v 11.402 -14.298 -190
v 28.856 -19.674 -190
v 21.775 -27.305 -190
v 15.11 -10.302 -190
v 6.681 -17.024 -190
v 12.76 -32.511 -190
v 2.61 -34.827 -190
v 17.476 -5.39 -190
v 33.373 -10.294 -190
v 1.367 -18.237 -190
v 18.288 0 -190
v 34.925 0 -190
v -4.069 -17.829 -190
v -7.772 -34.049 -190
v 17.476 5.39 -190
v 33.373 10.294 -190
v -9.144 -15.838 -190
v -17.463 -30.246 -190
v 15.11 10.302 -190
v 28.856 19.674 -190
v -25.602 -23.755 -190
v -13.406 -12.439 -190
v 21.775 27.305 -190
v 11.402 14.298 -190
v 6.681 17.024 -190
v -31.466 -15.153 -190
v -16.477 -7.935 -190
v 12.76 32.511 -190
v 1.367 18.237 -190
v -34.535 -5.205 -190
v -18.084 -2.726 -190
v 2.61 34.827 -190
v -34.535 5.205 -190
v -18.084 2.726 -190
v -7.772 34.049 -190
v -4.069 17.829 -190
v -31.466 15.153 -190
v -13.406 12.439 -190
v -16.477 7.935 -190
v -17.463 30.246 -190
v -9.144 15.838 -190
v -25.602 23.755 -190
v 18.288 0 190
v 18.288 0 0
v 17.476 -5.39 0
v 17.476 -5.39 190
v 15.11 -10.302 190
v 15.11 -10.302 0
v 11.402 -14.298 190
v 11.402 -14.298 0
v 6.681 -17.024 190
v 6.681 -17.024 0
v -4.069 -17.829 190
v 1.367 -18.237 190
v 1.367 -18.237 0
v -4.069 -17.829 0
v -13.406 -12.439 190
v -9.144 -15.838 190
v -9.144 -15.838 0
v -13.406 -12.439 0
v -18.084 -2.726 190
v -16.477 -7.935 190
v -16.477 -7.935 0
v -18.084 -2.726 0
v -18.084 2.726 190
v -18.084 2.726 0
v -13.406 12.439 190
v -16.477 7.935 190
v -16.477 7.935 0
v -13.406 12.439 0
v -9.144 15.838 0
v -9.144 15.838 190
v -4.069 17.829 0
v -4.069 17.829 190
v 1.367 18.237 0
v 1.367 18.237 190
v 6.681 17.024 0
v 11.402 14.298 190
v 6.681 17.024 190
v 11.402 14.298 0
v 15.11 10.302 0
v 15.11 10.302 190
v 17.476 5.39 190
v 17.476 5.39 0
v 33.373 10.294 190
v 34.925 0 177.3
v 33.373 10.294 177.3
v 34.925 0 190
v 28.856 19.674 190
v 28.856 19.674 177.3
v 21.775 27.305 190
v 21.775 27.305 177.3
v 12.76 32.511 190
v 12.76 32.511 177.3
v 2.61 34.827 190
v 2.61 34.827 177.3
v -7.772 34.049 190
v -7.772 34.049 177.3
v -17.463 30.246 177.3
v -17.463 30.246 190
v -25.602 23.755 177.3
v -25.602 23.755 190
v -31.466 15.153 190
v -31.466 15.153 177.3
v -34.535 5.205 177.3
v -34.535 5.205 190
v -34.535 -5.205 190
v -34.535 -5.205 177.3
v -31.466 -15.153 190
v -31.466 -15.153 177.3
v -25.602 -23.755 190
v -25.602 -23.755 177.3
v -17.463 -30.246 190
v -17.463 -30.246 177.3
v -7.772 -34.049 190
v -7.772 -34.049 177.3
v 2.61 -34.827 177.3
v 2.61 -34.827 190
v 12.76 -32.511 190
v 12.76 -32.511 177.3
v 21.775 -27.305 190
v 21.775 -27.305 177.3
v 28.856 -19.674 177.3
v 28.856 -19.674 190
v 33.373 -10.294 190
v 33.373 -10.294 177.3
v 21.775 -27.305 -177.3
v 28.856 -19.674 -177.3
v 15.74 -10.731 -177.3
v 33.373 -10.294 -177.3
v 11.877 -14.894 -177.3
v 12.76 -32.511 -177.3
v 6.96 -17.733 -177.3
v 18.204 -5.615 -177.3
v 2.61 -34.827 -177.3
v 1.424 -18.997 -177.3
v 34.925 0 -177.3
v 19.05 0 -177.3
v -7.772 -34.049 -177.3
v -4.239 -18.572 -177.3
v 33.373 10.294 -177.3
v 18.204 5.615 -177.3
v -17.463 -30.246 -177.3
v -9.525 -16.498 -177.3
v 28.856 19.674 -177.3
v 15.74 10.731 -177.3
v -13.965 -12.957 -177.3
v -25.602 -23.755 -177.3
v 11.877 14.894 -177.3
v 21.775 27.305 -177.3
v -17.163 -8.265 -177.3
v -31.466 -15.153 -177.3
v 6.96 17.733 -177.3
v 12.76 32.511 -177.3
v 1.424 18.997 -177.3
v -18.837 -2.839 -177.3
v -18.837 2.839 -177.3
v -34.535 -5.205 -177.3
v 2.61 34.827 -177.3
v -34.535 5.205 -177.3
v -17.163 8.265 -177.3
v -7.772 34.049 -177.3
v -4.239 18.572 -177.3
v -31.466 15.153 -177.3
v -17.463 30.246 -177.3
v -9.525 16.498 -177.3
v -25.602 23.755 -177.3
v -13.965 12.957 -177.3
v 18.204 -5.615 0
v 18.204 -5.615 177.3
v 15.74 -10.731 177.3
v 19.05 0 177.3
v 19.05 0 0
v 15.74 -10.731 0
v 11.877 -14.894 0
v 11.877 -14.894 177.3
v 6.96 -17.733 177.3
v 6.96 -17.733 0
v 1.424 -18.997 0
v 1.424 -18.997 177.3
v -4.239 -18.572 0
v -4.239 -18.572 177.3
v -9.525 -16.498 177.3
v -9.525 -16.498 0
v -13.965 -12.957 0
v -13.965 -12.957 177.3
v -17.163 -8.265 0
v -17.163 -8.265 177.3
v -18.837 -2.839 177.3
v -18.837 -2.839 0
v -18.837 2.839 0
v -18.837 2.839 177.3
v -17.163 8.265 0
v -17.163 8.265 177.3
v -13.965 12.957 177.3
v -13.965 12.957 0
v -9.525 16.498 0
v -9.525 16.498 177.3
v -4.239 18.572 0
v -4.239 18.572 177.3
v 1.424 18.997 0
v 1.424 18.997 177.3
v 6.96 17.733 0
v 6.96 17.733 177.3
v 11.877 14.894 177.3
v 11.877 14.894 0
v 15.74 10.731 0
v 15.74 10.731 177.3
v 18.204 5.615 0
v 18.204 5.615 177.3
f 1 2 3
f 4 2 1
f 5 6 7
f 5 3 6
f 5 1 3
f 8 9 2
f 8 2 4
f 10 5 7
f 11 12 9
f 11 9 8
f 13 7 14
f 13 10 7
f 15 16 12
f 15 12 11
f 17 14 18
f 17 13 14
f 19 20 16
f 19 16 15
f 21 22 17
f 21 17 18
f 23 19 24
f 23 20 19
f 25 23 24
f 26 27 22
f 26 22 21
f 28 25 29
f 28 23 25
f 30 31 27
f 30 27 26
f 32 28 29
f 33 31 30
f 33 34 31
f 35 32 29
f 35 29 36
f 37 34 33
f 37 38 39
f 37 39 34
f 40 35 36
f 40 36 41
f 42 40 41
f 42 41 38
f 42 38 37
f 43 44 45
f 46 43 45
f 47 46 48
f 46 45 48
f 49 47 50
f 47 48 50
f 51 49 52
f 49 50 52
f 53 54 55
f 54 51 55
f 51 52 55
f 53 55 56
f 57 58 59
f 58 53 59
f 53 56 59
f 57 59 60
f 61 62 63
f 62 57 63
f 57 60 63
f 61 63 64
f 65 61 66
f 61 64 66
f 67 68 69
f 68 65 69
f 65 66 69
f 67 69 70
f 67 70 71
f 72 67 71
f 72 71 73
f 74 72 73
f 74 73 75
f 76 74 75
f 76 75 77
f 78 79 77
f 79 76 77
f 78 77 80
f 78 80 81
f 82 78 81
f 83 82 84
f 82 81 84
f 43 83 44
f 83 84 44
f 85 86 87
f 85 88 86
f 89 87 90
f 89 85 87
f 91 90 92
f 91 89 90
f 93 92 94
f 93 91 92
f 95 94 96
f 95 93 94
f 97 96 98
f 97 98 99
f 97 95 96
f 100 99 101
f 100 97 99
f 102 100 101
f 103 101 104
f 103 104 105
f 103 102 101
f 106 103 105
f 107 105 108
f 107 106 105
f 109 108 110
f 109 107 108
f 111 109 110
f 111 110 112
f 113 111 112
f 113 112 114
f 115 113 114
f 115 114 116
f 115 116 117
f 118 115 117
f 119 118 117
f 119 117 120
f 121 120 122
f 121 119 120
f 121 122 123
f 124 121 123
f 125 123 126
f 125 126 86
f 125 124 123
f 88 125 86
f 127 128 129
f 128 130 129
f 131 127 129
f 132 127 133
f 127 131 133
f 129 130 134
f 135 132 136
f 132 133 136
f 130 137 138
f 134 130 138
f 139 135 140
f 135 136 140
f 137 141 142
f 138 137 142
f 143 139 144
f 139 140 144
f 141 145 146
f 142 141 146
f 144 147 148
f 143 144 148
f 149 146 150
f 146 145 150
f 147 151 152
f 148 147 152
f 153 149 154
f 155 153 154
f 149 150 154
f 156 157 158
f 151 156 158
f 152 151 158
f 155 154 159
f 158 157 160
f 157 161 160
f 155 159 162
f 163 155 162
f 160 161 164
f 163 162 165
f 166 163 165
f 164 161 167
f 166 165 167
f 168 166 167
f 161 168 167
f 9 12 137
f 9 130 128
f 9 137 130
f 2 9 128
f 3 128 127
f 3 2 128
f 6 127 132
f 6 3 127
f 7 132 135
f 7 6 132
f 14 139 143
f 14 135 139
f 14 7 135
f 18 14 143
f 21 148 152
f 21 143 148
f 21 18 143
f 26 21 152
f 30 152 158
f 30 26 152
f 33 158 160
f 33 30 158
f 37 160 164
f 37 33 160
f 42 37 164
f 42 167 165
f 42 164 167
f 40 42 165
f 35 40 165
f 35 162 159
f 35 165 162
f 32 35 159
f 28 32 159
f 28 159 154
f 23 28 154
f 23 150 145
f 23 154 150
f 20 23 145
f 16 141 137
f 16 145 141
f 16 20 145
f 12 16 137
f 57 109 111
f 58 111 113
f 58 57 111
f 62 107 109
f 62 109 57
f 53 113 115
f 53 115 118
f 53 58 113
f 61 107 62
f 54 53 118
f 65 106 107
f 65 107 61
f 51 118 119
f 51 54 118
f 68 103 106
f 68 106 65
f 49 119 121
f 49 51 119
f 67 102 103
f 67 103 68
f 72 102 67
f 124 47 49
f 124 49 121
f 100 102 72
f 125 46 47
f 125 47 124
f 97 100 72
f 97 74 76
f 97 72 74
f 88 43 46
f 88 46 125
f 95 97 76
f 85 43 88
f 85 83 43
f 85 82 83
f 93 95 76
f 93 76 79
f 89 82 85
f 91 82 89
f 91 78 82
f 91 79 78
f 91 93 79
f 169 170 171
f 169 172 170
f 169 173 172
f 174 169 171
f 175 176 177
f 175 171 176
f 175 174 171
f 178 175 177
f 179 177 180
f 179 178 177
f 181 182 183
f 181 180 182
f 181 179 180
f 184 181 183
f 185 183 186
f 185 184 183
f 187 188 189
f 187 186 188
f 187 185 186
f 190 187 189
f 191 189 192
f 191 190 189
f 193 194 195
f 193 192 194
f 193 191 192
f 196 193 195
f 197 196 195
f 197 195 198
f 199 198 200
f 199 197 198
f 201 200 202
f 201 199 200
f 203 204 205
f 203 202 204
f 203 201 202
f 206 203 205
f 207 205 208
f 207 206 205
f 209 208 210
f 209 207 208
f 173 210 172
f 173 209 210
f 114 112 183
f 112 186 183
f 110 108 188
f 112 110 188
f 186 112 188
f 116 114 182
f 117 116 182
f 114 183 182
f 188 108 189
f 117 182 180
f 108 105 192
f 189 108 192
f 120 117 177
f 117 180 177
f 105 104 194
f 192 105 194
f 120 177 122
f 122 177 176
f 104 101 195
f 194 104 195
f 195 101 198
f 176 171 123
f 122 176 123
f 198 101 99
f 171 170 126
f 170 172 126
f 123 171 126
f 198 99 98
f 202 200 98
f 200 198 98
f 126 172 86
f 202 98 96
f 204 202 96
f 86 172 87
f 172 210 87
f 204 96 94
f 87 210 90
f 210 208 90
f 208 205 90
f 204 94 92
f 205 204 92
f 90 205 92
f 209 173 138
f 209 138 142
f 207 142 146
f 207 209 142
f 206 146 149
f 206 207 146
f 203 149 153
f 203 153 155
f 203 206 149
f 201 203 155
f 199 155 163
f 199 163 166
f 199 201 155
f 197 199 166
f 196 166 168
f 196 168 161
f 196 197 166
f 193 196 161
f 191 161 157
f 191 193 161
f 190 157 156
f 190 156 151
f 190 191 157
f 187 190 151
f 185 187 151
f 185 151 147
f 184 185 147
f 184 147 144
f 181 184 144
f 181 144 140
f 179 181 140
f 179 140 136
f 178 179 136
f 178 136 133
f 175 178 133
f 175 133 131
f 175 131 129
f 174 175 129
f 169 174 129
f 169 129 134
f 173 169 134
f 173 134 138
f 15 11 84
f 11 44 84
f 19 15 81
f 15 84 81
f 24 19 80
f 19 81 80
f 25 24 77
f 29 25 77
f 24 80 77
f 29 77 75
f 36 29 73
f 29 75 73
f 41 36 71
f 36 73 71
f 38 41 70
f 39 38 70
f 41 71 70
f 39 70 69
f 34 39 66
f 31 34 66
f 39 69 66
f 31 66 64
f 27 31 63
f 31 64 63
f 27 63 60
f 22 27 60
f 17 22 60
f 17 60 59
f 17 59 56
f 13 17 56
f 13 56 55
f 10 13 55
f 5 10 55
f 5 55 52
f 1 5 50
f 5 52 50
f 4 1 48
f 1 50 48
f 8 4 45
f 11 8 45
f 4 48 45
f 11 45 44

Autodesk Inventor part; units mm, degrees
ref_plane "YZ Plane" through (0, 0, 0) normal (1, 0, 0) x (0, 1, 0)
ref_plane "XZ Plane" through (0, 0, 0) normal (0, 1, 0) x (-1, 0, 0)
ref_plane "XY Plane" through (0, 0, 0) normal (0, 0, 1) x (1, 0, 0)
sketch "Sketch1" plane through (0, 0, 0) normal (0, 0, 1) x (1, 0, 0)
  circle A0 centre (0, 0) radius 19.05
  circle A1 centre (0, 0) radius 18.288
  dimension "d6" = 38.1
  dimension "d9" = 36.576
extrude "Extrusion1" add sketch "Sketch1" along normal mid plane 380
sketch "Sketch2" plane through (0, 0, 190) normal (0, 0, 1) x (1, 0, 0)
  circle A0 centre (0, 0) radius 34.925
  circle A1 centre (0, 0) radius 19.05 projected
  dimension "d10" = 69.85
extrude "Extrusion2" add sketch "Sketch2" against normal blind 12.7
mirror "Mirror1" about plane through (0, 0, 0) normal (0, 0, 1) of "Extrusion2"
equation "\"d7\" = Length"
equation "\"Length\" = 380"
properties part number "Pipe300"
